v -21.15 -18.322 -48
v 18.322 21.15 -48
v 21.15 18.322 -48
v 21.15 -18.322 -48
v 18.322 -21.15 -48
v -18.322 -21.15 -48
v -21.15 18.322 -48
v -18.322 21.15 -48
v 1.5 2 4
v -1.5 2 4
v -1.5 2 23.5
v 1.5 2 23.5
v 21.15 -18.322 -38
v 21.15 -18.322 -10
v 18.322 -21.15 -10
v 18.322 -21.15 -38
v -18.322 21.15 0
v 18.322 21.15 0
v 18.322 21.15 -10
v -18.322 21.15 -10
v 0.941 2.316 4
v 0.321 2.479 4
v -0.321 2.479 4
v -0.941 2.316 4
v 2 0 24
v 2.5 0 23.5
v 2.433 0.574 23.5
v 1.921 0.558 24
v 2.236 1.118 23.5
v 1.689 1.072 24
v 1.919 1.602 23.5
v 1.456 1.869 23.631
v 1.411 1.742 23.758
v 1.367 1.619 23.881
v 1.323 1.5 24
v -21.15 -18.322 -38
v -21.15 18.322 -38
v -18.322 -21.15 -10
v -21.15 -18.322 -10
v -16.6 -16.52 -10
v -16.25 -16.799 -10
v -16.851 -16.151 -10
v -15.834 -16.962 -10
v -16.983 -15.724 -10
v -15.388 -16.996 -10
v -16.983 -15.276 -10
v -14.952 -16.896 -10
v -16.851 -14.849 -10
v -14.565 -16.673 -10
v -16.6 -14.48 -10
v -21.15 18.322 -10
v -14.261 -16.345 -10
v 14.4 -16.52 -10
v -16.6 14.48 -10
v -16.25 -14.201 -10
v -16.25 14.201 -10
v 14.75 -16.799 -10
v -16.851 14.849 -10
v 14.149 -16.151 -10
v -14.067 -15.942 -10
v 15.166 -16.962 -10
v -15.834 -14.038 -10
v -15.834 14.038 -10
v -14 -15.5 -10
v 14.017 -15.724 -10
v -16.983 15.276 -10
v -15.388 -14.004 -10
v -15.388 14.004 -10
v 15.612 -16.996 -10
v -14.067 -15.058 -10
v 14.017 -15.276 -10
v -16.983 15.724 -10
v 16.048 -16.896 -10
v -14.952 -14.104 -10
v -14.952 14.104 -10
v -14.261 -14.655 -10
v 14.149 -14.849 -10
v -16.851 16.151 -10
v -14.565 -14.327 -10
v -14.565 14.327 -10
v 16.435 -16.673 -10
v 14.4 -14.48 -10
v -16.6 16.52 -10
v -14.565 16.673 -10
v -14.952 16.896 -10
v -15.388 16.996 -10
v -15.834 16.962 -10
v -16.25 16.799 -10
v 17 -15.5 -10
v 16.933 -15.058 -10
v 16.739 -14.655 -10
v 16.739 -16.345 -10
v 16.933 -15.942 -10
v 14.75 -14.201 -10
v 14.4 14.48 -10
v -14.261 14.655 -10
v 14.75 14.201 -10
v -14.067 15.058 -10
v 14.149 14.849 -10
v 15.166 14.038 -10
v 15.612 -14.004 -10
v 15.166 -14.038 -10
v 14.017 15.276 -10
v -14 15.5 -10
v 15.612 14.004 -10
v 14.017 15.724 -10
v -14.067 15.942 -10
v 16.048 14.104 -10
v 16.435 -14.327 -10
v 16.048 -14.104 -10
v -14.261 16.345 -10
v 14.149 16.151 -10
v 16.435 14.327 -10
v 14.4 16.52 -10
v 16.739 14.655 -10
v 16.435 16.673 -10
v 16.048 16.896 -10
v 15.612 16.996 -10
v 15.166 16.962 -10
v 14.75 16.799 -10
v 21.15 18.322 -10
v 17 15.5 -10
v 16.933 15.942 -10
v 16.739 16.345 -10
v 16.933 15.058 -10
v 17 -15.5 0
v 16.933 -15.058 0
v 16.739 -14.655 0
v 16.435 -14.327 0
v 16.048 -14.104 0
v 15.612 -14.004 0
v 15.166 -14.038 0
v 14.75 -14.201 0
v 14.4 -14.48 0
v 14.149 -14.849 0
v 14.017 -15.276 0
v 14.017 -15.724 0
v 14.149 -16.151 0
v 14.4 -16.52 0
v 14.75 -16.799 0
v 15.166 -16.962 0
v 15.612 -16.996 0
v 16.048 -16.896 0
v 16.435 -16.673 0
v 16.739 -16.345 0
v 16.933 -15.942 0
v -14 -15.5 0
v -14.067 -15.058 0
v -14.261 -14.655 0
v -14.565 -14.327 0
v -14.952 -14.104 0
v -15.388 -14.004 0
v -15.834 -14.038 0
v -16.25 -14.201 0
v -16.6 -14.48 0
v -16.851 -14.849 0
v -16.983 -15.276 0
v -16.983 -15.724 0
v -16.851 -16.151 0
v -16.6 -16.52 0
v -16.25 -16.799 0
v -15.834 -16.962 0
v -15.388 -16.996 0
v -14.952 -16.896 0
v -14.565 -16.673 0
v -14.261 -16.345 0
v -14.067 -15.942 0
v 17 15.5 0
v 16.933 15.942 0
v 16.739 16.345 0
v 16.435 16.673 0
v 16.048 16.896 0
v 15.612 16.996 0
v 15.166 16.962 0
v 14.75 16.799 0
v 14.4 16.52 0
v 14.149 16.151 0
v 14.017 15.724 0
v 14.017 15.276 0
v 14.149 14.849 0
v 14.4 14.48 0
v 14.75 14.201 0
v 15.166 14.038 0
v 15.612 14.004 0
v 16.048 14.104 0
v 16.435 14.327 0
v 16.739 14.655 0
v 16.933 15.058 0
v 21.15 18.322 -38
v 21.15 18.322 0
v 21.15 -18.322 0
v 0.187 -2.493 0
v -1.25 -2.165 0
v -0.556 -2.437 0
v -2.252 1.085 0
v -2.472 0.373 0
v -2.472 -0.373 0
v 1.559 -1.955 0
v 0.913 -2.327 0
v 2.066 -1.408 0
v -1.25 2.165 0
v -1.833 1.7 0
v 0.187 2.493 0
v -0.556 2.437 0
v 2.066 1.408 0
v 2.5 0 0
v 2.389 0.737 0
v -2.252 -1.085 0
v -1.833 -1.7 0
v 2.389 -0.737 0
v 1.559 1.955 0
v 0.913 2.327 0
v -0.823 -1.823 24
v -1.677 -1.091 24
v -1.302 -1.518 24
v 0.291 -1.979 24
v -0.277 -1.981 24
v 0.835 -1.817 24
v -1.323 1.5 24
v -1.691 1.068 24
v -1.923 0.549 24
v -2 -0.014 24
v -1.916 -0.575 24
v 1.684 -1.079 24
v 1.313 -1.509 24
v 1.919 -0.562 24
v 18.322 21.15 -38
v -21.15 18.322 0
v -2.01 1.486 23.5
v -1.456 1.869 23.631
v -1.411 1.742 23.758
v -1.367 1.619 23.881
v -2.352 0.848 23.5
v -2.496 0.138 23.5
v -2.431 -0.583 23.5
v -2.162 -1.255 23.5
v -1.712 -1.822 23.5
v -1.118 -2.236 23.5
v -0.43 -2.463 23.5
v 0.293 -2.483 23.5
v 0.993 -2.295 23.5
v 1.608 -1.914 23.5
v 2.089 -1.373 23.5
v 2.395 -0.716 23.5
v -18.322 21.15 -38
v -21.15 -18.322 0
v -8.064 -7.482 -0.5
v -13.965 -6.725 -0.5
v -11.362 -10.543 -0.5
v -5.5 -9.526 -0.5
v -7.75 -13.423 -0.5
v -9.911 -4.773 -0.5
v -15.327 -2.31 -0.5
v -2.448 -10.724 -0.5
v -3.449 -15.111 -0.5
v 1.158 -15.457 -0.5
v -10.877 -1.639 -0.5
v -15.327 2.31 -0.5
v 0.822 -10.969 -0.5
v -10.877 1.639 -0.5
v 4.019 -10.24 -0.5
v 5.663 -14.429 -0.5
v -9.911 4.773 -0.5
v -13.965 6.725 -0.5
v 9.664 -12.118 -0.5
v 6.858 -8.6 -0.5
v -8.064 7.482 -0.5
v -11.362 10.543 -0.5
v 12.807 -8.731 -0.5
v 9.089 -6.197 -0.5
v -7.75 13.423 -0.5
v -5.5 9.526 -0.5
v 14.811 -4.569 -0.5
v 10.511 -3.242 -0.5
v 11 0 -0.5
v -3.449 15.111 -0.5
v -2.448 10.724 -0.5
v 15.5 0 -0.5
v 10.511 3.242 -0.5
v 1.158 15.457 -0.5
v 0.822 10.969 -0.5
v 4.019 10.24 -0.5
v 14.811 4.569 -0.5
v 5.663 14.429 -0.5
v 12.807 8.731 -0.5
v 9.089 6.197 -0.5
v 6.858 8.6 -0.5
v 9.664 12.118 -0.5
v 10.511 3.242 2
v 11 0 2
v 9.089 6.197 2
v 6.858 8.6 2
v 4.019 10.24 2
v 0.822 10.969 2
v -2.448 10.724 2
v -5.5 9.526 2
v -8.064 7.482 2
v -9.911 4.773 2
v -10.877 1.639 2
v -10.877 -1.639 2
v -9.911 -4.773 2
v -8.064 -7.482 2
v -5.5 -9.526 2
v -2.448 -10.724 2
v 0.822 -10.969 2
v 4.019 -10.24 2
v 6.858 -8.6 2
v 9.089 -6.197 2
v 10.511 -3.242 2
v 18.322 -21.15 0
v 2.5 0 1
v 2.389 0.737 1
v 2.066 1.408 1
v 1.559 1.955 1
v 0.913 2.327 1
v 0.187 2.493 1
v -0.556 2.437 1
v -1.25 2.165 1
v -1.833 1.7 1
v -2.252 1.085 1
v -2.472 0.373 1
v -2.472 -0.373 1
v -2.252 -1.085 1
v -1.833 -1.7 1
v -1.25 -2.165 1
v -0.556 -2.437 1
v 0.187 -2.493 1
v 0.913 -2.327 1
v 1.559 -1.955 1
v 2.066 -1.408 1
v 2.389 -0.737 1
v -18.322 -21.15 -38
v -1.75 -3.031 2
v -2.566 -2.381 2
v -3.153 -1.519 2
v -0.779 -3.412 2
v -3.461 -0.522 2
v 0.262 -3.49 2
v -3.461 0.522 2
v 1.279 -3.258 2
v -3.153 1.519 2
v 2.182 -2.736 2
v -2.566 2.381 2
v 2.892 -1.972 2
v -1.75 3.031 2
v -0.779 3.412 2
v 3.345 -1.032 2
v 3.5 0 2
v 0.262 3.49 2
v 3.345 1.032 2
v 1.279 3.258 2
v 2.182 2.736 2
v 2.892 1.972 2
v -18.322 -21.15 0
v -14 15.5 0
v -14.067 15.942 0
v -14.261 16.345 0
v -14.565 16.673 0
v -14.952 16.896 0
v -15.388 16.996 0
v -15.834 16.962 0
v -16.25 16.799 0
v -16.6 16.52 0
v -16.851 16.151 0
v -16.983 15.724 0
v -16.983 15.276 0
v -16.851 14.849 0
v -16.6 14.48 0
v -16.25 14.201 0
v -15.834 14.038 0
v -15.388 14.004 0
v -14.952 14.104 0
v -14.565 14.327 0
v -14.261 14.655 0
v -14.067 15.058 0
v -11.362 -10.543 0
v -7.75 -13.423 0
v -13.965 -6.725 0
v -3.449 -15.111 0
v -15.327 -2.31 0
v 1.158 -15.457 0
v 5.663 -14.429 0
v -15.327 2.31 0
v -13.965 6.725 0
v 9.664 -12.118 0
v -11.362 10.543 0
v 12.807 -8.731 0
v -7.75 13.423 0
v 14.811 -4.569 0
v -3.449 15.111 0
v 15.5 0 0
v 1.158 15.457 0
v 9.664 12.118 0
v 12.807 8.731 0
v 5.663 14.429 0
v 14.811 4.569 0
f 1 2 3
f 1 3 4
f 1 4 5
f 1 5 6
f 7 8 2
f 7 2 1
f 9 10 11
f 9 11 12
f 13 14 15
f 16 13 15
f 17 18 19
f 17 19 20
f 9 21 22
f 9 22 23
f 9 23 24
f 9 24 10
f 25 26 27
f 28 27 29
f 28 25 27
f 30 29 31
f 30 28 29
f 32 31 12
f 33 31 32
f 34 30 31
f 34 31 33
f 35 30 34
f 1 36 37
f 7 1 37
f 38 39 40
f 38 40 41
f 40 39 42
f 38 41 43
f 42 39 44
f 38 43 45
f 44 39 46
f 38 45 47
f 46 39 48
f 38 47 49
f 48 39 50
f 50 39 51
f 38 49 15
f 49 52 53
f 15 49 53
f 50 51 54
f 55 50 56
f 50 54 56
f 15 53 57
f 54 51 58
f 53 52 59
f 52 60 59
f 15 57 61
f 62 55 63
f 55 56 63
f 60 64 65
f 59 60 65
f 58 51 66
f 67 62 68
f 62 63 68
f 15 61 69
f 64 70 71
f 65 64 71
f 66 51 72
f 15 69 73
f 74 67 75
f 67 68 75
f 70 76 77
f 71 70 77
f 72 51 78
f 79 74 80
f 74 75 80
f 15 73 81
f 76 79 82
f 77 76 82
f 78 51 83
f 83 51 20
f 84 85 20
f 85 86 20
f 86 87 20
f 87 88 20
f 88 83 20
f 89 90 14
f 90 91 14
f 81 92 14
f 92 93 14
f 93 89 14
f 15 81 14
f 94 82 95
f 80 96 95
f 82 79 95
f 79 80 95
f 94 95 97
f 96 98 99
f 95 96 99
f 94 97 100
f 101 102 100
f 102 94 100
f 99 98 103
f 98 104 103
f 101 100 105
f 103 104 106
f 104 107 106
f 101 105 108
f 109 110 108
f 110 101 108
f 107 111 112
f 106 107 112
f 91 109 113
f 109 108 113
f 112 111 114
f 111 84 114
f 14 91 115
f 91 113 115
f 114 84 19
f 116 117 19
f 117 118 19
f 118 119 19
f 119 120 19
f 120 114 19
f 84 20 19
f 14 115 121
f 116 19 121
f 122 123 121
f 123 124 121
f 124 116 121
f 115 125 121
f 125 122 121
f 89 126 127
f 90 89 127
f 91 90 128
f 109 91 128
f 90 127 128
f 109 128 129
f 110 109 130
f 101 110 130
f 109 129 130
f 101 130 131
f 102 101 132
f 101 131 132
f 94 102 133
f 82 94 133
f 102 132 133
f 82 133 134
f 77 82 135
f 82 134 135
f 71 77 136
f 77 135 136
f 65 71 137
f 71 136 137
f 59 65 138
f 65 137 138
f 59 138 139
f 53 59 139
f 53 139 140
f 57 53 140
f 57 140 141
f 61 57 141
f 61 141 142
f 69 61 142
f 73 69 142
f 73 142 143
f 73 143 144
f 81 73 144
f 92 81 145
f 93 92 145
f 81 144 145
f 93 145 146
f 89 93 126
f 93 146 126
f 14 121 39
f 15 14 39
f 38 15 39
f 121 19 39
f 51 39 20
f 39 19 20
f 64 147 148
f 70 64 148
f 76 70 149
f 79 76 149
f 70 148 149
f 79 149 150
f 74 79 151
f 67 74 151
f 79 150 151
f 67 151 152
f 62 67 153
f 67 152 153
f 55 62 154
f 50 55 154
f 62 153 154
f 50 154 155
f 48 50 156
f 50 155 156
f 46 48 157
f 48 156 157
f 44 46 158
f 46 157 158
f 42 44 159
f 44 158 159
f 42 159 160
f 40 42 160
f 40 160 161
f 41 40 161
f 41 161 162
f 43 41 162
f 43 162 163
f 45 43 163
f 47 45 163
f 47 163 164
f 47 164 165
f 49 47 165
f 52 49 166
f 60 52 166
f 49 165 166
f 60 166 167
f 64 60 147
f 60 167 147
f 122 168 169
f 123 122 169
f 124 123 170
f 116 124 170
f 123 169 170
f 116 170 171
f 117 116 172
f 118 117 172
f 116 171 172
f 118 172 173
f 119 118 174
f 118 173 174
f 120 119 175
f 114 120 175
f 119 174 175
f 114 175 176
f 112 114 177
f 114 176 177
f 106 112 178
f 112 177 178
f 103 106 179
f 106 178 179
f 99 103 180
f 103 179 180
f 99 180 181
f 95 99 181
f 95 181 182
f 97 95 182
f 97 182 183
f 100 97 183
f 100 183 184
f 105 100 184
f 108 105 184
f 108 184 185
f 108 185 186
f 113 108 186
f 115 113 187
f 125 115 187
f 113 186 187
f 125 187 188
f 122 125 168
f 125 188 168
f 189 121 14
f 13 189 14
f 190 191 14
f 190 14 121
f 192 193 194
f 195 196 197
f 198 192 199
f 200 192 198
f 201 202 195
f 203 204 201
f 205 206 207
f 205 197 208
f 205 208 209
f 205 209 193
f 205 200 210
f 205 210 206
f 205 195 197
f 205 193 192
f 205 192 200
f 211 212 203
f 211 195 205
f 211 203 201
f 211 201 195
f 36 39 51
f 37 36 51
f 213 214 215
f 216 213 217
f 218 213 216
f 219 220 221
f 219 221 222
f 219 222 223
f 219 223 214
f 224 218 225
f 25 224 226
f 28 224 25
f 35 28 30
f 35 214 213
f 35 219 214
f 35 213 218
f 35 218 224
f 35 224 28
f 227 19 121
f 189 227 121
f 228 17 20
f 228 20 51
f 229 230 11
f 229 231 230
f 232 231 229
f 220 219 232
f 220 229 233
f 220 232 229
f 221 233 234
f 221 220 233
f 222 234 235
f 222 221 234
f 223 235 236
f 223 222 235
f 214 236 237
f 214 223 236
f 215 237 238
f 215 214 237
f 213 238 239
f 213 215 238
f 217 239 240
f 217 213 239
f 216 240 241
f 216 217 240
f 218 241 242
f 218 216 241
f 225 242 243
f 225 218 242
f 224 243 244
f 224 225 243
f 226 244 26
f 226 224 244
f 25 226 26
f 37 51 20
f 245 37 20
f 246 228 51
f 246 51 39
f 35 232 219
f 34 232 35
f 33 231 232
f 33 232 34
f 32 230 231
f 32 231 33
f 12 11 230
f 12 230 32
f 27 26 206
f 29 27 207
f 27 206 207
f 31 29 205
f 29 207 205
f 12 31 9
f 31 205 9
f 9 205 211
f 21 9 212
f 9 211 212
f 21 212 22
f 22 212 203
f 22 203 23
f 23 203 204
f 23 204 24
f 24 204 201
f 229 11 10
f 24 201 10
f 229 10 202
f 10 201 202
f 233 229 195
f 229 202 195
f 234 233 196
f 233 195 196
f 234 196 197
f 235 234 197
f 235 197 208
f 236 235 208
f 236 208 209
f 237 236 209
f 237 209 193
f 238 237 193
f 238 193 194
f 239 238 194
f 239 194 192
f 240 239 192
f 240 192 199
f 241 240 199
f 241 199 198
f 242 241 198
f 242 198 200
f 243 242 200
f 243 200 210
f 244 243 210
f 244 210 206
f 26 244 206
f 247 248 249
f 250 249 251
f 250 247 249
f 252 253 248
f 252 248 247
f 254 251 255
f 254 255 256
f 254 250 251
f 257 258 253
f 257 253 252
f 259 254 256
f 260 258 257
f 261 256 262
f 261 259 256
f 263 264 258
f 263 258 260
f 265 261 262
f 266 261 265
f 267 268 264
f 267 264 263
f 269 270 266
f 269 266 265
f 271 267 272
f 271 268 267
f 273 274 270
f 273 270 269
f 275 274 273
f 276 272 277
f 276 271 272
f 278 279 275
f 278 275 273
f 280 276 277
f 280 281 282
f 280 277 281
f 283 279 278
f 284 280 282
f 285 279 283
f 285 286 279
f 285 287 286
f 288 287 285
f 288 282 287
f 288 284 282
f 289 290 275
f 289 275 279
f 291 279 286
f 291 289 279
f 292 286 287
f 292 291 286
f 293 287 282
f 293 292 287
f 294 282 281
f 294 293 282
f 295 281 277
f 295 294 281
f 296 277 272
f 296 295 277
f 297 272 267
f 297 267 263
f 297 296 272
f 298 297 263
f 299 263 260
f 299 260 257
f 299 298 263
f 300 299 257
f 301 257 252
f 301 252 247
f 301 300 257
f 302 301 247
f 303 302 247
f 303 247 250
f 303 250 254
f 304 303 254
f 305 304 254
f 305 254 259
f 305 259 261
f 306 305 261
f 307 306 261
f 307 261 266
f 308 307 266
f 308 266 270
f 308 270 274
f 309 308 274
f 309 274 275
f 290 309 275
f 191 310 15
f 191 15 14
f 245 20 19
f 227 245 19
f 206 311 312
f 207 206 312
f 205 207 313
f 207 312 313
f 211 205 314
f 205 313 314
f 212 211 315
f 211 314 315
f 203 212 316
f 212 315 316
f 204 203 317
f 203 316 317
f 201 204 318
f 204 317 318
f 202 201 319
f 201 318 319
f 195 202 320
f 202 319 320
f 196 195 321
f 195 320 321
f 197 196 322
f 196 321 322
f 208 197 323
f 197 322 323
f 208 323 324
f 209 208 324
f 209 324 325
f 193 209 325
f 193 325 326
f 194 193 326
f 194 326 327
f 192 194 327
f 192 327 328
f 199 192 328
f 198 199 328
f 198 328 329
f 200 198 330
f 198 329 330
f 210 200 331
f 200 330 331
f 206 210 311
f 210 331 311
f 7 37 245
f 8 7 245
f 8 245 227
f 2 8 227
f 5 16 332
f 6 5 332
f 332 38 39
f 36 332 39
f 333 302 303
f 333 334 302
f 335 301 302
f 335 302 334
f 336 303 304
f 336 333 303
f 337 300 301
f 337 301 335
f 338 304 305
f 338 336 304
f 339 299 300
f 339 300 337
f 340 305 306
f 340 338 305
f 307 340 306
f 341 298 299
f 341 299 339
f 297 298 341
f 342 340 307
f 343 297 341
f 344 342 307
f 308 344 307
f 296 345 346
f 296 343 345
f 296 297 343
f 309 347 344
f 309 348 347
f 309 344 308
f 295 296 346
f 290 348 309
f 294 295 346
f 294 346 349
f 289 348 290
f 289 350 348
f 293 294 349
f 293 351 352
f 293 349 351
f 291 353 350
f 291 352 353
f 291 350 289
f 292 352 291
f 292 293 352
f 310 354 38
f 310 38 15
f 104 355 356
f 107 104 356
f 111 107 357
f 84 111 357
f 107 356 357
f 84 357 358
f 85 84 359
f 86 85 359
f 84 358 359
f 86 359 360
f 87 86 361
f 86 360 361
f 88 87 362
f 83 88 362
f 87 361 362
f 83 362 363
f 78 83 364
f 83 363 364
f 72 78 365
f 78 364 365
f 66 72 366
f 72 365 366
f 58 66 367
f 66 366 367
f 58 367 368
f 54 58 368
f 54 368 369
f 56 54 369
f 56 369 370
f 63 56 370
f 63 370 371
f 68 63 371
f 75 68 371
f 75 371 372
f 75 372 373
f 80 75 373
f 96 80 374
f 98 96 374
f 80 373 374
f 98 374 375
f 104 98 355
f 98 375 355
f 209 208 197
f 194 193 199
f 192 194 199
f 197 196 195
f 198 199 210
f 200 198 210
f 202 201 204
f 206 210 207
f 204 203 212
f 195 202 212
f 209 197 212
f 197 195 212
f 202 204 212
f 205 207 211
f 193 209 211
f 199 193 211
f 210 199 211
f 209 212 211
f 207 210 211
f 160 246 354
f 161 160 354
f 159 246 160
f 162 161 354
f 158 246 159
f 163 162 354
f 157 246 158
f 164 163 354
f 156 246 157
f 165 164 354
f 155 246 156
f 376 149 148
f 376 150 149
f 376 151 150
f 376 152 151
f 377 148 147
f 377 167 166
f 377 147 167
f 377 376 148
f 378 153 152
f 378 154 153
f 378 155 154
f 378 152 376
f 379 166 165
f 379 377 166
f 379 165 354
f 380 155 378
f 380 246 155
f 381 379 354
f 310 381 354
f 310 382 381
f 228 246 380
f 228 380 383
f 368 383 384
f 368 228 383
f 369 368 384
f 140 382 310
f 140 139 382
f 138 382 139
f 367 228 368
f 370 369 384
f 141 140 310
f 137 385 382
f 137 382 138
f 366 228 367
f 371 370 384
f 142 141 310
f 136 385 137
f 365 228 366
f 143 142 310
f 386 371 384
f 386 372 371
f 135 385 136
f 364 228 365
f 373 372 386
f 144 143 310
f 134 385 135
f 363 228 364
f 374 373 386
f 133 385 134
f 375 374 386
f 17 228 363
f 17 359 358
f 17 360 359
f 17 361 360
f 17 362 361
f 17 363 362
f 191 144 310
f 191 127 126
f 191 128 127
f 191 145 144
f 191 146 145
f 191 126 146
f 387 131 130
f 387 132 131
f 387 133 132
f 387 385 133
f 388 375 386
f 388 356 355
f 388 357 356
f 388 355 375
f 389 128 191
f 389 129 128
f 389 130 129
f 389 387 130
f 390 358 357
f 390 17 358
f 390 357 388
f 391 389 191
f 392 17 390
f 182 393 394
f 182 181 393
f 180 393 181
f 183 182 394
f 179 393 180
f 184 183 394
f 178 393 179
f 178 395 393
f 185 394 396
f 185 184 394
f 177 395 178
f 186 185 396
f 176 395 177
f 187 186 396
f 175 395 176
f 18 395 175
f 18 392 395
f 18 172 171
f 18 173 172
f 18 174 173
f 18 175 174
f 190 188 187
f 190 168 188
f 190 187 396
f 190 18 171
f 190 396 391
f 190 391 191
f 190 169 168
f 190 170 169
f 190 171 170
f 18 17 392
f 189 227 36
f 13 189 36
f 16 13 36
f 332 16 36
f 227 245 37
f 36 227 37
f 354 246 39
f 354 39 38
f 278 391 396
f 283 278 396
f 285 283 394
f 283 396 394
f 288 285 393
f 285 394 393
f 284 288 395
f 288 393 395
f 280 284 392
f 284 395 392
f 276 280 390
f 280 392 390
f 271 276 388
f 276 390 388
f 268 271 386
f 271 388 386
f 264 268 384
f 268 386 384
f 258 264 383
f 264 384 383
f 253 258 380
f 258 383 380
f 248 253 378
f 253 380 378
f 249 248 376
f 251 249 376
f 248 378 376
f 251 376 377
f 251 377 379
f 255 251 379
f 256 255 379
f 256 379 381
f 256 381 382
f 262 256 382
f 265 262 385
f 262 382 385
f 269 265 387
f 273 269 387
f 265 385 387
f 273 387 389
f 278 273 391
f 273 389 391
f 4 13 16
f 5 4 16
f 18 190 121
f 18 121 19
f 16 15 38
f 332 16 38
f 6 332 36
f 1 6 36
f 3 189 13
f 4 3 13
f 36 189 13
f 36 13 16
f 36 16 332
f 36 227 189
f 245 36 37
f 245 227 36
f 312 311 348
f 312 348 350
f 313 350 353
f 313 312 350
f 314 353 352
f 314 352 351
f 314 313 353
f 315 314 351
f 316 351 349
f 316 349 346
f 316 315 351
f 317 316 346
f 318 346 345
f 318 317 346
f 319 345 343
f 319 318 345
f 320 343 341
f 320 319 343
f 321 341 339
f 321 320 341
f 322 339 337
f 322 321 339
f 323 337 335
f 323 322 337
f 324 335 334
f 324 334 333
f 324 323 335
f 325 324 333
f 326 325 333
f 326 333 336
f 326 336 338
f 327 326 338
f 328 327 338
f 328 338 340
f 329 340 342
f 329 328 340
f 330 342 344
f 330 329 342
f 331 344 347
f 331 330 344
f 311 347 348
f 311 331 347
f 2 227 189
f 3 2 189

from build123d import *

# Parameters (mm, degrees)
SKETCH_1_R          = 1.5
EXTRUDE_1_DEPTH     = 10
EXTRUDE_2_DEPTH     = 28
EXTRUDE_3_DEPTH     = 10
SKETCH_1_3_R        = 15.5
SKETCH_1_3_R_2      = 11
CUT_EXTRUDE_1_DEPTH = 0.5
EXTRUDE_START       = 2
SKETCH_1_4_R        = 11
SKETCH_1_4_R_2      = 2.5
EXTRUDE_4_DEPTH     = 2
CHAMFER_1_SIZE      = 1
SKETCH_1_5_R        = 2.5
EXTRUDE_5_DEPTH     = 24
CUT_EXTRUDE_2_DEPTH = 20
CHAMFER_2_SIZE      = 0.5


with BuildPart() as part:
    # 草图1 → 凸台-拉伸1 (new body)
    with BuildSketch(Plane.XY):
        Polygon((18.321572875, 21.15), (-18.321572875, 21.15), (-21.15, 18.321572875), (-21.15, -18.321572875), (-18.321572875, -21.15), (18.321572875, -21.15), (21.15, -18.321572875), (21.15, 18.321572875), align=None)
        with Locations((-15.5, 15.5)):
            Circle(SKETCH_1_R, mode=Mode.SUBTRACT)
        with Locations((15.5, 15.5)):
            Circle(SKETCH_1_R, mode=Mode.SUBTRACT)
        with Locations((15.5, -15.5)):
            Circle(SKETCH_1_R, mode=Mode.SUBTRACT)
        with Locations((-15.5, -15.5)):
            Circle(SKETCH_1_R, mode=Mode.SUBTRACT)
    extrude(amount=-EXTRUDE_1_DEPTH)

    # 草图1<3> → 切除-拉伸1 (cut)
    with BuildSketch(Plane.XY):
        Circle(SKETCH_1_3_R)
        Circle(SKETCH_1_3_R_2, mode=Mode.SUBTRACT)
    extrude(amount=-CUT_EXTRUDE_1_DEPTH, mode=Mode.SUBTRACT)

    # 草图1<4> → 凸台-拉伸4 (add)
    with BuildSketch(Plane.XY.offset(EXTRUDE_START)):
        Circle(SKETCH_1_4_R)
        Circle(SKETCH_1_4_R_2, mode=Mode.SUBTRACT)
    extrude(amount=-EXTRUDE_4_DEPTH)

    # 倒角1
    chamfer_1_edges = [part.edges().sort_by_distance(p)[0] for p in [
        (-2.5, 0, 2),
    ]]
    chamfer(chamfer_1_edges, length=CHAMFER_1_SIZE)


with BuildPart() as body_2:
    # 草图2 → 凸台-拉伸2 (new body)
    with BuildSketch(Plane(origin=(0, 0, -10), x_dir=(-1, 0, 0), z_dir=(0, 0, -1))):
        Polygon((-21.15, 18.321572875), (-21.15, -18.321572875), (-18.321572875, -21.15), (18.321572875, -21.15), (21.15, -18.321572875), (21.15, 18.321572875), (18.321572875, 21.15), (-18.321572875, 21.15), align=None)
    extrude(amount=EXTRUDE_2_DEPTH)


with BuildPart() as body_3:
    # 草图3 → 凸台-拉伸3 (new body)
    with BuildSketch(Plane(origin=(0, 0, -38), x_dir=(-1, 0, 0), z_dir=(0, 0, -1))):
        Polygon((-18.321572875, 21.15), (-21.15, 18.321572875), (-21.15, -18.321572875), (-18.321572875, -21.15), (18.321572875, -21.15), (21.15, -18.321572875), (21.15, 18.321572875), (18.321572875, 21.15), align=None)
    extrude(amount=EXTRUDE_3_DEPTH)


with BuildPart() as body_4:
    # 草图1<5> → 凸台-拉伸5 (new body)
    with BuildSketch(Plane.XY):
        Circle(SKETCH_1_5_R)
    extrude(amount=EXTRUDE_5_DEPTH)

    # 草图4 → 切除-拉伸2 (cut)
    with BuildSketch(Plane.XY.offset(24)):
        with BuildLine():
            Line((-1.5, 2), (1.5, 2))
            ThreePointArc((1.5, 2), (0, 2.5), (-1.5, 2))
        make_face()
    extrude(amount=-CUT_EXTRUDE_2_DEPTH, mode=Mode.SUBTRACT)

    # 倒角2
    chamfer_2_edges = [body_4.edges().sort_by_distance(p)[0] for p in [
        (-1.118033989, -2.236067977, 24),
        (0, 2, 24),
    ]]
    chamfer(chamfer_2_edges, length=CHAMFER_2_SIZE - 0.0001)  # a hair under: the kernel refuses the full size


solid = Compound([part.part, body_2.part, body_3.part, body_4.part])
